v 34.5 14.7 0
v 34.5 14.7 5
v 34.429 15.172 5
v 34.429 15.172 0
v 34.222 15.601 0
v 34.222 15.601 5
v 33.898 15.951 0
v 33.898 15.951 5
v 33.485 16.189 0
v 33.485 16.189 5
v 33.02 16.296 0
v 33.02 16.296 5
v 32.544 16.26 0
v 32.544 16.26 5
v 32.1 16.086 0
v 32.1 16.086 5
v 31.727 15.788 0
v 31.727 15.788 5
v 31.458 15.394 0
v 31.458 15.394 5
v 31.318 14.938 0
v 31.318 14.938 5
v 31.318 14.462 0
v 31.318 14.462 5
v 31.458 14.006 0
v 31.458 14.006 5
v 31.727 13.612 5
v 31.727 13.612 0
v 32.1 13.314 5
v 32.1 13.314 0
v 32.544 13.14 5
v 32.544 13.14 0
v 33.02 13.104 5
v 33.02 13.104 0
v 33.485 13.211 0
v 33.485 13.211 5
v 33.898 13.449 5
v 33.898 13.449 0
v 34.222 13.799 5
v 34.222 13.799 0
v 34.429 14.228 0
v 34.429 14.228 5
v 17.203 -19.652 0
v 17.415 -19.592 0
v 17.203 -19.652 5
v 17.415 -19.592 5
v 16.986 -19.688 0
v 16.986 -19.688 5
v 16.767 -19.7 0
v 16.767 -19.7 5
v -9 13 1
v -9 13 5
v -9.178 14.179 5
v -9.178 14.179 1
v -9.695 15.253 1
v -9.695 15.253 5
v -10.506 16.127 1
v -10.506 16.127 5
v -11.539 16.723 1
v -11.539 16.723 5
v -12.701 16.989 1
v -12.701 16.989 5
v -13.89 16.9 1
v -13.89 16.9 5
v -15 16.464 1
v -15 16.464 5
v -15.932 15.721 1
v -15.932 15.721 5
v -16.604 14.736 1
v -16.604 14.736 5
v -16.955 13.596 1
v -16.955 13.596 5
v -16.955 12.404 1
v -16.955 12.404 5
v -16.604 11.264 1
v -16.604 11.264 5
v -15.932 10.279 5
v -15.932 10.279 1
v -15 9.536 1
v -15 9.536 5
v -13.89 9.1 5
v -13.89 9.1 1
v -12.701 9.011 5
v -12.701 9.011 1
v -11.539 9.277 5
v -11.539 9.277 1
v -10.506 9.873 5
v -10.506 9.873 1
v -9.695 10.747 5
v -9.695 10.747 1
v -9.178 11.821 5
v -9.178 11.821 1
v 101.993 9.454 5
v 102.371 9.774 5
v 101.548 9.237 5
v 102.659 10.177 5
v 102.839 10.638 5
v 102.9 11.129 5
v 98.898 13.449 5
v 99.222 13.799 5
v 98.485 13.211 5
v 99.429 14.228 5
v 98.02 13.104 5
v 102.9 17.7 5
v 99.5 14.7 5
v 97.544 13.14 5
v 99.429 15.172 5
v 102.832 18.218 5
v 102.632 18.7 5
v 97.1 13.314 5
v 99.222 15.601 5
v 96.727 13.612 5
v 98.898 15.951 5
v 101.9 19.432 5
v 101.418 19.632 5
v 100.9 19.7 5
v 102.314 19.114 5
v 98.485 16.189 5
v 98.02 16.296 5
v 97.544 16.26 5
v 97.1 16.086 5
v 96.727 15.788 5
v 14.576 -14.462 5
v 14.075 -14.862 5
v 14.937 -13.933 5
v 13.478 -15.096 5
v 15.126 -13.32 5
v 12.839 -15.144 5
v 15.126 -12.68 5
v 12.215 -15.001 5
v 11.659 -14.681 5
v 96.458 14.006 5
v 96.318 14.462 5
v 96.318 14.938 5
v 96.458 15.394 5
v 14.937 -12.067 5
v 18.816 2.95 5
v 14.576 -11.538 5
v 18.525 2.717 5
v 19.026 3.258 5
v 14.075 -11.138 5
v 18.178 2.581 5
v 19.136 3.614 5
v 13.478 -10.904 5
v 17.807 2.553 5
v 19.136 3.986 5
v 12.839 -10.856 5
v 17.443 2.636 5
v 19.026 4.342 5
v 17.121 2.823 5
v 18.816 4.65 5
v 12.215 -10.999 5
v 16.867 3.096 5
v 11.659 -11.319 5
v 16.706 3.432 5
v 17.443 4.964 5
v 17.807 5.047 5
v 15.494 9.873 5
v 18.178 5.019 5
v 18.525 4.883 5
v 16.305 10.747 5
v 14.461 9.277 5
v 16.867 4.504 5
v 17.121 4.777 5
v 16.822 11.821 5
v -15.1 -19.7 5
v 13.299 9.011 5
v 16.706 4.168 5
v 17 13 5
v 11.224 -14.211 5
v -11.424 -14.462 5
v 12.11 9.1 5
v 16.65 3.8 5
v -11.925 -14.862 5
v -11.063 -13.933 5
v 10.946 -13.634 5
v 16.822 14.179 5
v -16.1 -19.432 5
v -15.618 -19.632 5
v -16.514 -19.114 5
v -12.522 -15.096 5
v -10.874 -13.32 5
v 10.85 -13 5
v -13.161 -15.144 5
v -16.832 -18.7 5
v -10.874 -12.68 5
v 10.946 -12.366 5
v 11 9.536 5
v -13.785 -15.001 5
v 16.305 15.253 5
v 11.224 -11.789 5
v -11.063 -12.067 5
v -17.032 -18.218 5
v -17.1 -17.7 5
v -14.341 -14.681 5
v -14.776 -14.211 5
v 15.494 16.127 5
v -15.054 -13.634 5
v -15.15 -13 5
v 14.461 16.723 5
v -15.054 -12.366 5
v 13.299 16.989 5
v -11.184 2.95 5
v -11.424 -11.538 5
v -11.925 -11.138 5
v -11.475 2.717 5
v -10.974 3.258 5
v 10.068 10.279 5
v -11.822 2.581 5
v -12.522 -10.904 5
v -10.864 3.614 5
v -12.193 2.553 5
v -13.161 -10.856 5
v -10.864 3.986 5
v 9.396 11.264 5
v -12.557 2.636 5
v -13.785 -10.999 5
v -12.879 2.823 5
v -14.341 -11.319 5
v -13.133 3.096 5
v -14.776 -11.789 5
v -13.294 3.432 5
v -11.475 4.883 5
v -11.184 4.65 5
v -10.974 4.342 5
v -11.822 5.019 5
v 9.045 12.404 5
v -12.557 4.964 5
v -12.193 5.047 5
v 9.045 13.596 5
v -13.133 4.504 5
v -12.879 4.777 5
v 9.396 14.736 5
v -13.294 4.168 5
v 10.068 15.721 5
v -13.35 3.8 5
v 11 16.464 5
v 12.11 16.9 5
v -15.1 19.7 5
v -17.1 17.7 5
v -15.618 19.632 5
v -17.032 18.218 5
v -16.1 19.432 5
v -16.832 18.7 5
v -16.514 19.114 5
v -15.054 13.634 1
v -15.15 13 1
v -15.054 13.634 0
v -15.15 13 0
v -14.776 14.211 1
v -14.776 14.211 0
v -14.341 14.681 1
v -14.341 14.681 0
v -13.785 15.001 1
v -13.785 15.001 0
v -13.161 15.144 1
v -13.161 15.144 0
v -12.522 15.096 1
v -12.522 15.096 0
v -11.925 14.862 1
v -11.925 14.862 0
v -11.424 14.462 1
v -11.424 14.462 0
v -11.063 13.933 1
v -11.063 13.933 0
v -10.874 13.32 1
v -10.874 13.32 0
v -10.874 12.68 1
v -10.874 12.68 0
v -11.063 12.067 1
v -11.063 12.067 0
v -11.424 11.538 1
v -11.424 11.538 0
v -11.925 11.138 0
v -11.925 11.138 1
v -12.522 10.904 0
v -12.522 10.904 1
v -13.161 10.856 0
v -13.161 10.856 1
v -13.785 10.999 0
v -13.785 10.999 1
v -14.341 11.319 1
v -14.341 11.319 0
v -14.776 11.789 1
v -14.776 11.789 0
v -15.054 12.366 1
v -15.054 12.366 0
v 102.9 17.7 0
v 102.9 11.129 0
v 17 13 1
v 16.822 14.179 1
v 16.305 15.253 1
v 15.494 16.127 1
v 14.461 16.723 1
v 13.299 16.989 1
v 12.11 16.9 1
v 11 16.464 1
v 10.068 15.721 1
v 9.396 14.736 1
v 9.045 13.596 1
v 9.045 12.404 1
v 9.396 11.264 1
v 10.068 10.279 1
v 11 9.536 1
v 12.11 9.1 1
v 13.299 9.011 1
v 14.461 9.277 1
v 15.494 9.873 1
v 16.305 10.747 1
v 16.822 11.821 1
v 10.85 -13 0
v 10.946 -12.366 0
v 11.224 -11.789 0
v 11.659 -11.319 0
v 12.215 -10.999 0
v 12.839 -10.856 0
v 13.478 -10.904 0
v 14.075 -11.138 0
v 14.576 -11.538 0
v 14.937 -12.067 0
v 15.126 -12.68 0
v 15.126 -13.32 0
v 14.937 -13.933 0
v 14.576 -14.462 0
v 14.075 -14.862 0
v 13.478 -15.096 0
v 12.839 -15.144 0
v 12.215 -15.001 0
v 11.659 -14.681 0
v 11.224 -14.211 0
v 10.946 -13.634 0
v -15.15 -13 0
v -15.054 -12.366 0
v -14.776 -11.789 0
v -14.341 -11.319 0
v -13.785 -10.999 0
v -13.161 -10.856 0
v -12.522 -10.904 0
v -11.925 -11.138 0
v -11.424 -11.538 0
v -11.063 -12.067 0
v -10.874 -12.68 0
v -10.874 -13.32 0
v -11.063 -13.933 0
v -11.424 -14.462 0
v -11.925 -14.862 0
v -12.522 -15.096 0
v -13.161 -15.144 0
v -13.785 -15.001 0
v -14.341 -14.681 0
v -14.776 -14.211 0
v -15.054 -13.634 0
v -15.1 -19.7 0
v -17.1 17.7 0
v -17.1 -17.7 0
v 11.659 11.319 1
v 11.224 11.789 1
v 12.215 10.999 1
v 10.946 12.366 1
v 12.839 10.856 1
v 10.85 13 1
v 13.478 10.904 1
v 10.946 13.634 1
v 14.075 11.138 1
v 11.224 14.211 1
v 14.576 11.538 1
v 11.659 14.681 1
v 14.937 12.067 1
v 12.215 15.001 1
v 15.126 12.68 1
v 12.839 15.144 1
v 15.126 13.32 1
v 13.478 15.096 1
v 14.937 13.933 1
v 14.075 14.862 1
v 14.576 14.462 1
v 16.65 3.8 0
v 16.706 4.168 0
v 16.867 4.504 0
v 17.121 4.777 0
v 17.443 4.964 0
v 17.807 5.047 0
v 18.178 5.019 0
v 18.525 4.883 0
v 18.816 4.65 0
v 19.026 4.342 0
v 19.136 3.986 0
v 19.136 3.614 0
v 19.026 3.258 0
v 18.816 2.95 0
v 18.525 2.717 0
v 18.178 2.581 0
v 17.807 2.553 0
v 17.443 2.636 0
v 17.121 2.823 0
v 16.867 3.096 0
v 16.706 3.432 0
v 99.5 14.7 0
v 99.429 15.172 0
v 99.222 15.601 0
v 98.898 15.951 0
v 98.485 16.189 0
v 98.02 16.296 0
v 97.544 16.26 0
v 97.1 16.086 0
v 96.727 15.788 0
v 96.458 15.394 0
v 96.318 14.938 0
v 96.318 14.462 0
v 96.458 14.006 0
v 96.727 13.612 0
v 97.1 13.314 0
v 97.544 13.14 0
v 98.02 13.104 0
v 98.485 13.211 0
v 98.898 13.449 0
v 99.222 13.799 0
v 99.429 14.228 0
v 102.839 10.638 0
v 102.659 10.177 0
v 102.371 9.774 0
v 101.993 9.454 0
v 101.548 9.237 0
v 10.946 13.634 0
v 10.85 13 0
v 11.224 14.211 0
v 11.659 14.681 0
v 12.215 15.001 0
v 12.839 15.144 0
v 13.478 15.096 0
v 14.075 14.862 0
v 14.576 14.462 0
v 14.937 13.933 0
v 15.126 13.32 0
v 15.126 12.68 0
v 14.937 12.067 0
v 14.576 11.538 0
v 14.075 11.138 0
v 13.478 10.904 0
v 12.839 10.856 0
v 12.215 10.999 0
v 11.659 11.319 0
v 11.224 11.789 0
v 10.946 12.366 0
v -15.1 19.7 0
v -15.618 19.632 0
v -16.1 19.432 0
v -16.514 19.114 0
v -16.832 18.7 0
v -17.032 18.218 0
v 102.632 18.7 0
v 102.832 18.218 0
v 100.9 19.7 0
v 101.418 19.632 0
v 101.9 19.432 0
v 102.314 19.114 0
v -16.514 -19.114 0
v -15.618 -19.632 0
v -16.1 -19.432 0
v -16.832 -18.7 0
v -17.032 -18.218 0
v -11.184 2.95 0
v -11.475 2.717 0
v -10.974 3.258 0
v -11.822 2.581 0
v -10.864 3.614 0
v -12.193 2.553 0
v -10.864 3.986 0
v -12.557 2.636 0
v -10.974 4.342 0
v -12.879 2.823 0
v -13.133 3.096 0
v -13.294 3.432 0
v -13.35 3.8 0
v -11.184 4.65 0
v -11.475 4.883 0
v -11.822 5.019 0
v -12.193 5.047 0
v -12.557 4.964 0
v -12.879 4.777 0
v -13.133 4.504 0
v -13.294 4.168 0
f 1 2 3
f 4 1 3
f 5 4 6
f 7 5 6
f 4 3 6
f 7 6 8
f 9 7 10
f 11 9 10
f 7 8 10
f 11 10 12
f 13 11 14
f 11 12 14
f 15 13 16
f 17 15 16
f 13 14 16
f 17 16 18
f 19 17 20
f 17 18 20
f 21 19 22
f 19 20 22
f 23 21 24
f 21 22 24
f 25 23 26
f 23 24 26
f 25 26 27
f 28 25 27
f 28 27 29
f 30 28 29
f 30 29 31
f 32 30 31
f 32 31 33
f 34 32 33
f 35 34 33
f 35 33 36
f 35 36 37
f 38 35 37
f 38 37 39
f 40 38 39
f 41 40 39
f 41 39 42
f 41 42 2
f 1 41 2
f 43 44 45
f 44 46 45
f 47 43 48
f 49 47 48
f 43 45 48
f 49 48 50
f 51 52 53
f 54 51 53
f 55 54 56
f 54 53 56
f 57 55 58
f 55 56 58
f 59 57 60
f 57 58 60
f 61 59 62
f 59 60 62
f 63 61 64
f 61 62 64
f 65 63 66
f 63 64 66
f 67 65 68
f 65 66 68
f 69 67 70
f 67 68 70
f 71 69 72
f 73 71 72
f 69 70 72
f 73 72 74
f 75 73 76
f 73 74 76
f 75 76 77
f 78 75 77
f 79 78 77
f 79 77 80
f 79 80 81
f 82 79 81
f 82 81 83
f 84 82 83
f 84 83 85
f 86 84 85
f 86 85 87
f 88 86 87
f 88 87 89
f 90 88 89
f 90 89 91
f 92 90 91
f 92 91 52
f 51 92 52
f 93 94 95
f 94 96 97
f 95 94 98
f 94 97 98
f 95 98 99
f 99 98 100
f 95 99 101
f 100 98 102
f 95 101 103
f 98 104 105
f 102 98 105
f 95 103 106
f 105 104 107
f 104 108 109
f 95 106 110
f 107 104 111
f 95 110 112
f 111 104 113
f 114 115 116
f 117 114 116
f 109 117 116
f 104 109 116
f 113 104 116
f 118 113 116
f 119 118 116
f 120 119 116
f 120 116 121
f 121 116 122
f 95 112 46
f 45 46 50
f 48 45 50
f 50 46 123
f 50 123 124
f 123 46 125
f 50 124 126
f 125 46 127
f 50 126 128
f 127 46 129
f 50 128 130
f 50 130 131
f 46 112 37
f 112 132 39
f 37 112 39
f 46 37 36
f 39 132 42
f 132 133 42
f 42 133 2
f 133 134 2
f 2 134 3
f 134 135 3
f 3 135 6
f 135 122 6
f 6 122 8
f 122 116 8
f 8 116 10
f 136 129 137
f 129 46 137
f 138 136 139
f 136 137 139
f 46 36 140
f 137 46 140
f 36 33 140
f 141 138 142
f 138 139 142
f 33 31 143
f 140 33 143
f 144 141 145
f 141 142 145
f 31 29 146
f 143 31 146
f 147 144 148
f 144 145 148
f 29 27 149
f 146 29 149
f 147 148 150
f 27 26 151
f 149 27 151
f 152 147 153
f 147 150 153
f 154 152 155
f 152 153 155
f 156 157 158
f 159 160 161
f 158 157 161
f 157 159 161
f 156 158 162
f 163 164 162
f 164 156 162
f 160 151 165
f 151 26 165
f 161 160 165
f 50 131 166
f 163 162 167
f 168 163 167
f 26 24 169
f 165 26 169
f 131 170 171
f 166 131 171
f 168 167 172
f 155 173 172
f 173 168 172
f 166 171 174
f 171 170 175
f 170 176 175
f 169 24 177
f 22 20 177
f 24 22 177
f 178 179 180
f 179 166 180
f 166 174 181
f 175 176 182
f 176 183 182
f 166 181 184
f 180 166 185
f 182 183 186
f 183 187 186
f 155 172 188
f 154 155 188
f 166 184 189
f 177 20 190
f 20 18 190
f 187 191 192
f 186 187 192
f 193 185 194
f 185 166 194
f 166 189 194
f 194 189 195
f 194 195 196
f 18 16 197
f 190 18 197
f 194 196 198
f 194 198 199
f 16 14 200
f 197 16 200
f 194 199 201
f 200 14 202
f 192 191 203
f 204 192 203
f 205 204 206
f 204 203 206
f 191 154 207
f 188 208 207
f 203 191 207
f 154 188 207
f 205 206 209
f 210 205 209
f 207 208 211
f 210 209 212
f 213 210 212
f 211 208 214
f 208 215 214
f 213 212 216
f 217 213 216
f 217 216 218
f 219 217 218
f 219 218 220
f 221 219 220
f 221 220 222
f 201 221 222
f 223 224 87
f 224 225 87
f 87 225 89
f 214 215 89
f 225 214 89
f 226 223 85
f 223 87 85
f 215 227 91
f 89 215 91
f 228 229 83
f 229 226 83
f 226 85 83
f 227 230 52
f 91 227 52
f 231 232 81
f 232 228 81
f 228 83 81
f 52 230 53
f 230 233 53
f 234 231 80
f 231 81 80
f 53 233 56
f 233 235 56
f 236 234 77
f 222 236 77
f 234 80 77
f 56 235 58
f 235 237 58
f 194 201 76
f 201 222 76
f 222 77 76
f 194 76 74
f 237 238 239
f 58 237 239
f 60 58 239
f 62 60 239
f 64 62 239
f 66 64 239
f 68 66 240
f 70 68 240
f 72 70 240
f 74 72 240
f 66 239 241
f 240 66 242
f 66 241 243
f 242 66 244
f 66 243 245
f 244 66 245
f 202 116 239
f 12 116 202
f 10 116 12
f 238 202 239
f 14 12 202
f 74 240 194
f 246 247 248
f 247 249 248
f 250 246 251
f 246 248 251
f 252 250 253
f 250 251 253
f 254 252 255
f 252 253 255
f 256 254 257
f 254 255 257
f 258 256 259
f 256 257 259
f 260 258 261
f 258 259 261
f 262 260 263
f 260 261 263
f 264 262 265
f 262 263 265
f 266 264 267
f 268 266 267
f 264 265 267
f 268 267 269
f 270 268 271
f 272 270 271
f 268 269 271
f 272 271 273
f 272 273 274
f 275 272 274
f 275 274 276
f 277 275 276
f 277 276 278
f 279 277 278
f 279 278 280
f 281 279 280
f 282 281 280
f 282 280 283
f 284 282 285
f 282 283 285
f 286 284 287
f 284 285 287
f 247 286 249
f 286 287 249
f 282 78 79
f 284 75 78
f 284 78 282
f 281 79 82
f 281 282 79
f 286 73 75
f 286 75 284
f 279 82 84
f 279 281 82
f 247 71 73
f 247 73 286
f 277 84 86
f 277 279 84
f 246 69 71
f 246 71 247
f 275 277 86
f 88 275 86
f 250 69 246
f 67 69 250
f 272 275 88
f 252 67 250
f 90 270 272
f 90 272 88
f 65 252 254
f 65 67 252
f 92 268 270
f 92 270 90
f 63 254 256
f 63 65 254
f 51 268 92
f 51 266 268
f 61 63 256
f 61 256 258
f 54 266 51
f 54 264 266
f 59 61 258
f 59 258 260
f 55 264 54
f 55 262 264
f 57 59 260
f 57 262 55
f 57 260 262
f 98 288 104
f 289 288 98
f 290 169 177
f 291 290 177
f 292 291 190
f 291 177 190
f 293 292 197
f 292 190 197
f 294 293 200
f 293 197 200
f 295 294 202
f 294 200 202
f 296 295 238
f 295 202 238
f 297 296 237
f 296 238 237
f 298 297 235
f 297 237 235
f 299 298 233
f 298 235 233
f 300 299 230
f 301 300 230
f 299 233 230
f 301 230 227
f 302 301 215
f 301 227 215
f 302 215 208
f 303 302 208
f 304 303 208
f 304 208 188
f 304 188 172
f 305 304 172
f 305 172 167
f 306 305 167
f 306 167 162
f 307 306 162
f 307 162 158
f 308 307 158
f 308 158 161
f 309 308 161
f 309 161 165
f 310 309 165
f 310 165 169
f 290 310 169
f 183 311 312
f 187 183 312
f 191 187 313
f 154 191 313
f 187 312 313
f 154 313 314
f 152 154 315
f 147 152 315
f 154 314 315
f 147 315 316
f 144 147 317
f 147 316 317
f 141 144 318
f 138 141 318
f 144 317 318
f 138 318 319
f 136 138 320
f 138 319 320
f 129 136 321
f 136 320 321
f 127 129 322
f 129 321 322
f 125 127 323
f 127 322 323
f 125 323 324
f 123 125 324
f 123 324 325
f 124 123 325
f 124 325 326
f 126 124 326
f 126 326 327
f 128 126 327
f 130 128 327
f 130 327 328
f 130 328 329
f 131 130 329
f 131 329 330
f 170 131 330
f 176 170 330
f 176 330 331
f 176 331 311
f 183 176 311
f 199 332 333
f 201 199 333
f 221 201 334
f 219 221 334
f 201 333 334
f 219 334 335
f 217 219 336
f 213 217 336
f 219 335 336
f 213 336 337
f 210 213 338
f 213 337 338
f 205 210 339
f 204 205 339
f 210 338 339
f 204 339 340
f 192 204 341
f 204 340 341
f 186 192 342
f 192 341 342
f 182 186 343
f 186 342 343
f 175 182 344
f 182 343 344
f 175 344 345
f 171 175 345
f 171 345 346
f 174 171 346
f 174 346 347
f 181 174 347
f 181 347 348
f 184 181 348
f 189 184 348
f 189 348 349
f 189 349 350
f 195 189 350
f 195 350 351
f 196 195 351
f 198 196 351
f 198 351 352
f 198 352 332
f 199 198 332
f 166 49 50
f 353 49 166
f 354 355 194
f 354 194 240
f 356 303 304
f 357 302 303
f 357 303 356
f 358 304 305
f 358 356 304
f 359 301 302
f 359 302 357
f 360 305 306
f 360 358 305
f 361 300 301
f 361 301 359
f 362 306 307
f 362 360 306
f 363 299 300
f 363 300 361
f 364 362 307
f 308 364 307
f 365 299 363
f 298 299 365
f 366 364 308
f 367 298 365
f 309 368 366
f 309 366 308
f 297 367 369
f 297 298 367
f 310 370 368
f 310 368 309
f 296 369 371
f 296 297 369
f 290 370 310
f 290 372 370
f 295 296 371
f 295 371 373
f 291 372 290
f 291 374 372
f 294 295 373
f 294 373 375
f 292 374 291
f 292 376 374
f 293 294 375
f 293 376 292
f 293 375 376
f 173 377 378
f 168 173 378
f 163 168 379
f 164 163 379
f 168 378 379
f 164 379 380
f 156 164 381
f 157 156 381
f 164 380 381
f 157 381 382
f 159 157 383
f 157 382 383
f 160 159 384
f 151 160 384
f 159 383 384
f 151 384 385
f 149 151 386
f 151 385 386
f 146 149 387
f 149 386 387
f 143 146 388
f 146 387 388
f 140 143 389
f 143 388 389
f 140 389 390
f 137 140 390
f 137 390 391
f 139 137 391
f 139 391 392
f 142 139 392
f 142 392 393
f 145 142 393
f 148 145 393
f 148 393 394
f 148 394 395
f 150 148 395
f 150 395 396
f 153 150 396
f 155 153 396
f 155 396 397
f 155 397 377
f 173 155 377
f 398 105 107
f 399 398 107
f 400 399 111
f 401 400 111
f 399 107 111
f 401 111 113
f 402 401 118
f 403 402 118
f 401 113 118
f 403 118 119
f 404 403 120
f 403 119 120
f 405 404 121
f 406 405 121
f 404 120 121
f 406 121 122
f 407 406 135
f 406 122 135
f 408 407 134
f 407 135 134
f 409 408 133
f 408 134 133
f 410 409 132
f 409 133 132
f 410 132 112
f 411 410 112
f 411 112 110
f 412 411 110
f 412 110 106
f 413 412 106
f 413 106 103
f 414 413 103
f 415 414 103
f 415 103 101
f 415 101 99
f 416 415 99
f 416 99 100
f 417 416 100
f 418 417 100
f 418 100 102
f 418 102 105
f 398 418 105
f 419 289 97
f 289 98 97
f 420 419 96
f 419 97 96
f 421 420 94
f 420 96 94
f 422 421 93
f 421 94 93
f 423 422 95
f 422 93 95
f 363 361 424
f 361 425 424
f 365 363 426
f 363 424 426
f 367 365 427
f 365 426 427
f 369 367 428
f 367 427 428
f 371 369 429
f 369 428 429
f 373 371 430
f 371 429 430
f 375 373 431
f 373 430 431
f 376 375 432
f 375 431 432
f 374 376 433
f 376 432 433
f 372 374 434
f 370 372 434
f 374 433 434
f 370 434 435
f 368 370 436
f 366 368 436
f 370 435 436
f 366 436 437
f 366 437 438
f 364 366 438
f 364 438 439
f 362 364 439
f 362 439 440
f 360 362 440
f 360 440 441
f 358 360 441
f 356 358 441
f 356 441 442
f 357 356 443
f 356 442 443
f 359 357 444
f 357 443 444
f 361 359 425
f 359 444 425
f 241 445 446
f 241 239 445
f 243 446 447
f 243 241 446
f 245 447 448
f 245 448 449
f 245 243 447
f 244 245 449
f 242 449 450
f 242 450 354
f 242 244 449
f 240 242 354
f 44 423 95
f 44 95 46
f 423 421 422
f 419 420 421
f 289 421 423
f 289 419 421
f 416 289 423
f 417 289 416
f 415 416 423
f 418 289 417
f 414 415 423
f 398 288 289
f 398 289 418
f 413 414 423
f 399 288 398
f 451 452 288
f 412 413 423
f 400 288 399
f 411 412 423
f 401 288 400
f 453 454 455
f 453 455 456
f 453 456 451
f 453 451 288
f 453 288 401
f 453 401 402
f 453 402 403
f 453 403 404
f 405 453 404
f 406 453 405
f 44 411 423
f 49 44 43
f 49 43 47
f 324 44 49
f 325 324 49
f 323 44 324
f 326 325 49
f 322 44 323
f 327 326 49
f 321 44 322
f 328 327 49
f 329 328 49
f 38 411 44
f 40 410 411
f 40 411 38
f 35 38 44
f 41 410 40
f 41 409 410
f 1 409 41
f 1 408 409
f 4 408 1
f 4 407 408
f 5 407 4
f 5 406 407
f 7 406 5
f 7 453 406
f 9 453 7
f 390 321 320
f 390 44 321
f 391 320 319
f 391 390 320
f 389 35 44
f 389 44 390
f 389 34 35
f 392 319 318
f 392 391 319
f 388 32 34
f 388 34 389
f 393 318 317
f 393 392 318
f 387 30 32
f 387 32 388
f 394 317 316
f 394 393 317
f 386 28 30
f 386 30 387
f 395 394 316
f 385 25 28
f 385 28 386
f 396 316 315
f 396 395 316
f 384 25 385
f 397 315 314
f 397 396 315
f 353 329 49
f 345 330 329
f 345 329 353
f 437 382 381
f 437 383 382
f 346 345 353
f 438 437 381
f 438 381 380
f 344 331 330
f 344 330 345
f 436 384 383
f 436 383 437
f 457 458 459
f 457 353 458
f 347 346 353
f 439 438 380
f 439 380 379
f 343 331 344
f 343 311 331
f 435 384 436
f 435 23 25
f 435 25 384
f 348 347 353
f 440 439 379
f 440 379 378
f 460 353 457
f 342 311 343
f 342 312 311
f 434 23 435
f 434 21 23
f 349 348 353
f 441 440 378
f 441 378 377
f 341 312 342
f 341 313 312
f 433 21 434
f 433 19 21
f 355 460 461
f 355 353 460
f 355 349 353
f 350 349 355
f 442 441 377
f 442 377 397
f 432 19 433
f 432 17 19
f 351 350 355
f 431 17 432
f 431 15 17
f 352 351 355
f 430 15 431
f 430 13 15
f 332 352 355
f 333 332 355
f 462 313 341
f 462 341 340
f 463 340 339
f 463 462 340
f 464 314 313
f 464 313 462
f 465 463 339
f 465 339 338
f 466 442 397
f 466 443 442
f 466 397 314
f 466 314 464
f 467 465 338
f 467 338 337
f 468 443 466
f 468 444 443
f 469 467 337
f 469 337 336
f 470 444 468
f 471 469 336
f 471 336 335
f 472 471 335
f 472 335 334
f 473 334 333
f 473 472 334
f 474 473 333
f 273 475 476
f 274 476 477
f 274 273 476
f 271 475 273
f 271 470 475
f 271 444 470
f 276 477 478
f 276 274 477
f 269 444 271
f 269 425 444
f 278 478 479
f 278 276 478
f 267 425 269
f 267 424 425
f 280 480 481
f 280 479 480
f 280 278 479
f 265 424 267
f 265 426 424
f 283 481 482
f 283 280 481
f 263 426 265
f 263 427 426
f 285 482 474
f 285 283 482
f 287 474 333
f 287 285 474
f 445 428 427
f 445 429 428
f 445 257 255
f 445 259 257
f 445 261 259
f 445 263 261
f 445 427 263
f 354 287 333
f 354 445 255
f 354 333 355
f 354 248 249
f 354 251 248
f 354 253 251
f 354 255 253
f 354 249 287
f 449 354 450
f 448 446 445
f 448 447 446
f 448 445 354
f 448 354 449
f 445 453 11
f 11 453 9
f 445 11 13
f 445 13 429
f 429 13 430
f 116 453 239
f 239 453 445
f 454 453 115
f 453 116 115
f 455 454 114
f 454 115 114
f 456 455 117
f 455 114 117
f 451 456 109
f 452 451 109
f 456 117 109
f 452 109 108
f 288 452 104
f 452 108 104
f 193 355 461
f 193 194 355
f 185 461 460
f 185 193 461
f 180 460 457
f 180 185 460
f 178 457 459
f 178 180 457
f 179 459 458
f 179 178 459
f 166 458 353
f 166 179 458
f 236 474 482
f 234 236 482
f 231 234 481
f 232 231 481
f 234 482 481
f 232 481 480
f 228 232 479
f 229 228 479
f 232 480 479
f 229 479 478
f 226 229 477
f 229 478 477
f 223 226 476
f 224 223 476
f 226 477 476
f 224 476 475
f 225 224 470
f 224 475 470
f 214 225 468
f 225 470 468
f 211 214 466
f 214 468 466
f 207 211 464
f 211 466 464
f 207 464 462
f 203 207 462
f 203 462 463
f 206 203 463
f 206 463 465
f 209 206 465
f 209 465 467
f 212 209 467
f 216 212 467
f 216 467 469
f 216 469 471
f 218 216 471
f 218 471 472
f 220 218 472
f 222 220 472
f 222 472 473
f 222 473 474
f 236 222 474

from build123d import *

# Parameters (mm, degrees)
BOSS_EXTRUDE1_DEPTH            = 5
CBORE_FOR_M4_SHCS1_D           = 4.3
CBORE_FOR_M4_SHCS1_CBORE_D     = 8
CBORE_FOR_M4_SHCS1_CBORE_DEPTH = 4
M4_CLEARANCE_HOLE1_D           = 4.3
TAP_DRILL_FOR_M3X0_5_TAP1_D    = 2.5
M3_CLEARANCE_HOLE2_D           = 3.2
FILLET1_R                      = 2


with BuildPart() as part:
    # Sketch1 → Boss-Extrude1 (new body)
    with BuildSketch(Plane.XY):
        Polygon((17.1, 19.7), (102.9, 19.7), (102.9, 9.7), (17.1, -19.7), (-17.1, -19.7), (-17.1, 19.7), align=None)
    extrude(amount=BOSS_EXTRUDE1_DEPTH)

    # CBORE for M4 SHCS1 (through all)
    with Locations(Plane.XY.offset(5)):
        with Locations((13, 13), (-13, 13)):
            CounterBoreHole(CBORE_FOR_M4_SHCS1_D / 2, CBORE_FOR_M4_SHCS1_CBORE_D / 2, CBORE_FOR_M4_SHCS1_CBORE_DEPTH)

    # M4 Clearance Hole1 (through all)
    with Locations(Plane.XY.offset(5)):
        with Locations((-13, -13), (13, -13)):
            Hole(M4_CLEARANCE_HOLE1_D / 2)

    # Tap Drill for M3x0.5 Tap1 (through all)
    with Locations(Plane.XY.offset(5)):
        with Locations((-12.1, 3.8), (17.9, 3.8)):
            Hole(TAP_DRILL_FOR_M3X0_5_TAP1_D / 2)

    # M3 Clearance Hole2 (through all)
    with Locations(Plane(origin=(0, 0, 0), x_dir=(-1, 0, 0), z_dir=(0, 0, -1))):
        with Locations((-97.9, 14.7), (-32.9, 14.7)):
            Hole(M3_CLEARANCE_HOLE2_D / 2)

    # Fillet1
    fillet1_edges = [part.edges().sort_by_distance(p)[0] for p in [
        (-17.1, 19.7, 2.5),
        (102.9, 19.7, 2.5),
        (102.9, 9.7, 2.5),
        (17.1, -19.7, 2.5),
        (-17.1, -19.7, 2.5),
    ]]
    fillet(fillet1_edges, radius=FILLET1_R)


solid = part.part
